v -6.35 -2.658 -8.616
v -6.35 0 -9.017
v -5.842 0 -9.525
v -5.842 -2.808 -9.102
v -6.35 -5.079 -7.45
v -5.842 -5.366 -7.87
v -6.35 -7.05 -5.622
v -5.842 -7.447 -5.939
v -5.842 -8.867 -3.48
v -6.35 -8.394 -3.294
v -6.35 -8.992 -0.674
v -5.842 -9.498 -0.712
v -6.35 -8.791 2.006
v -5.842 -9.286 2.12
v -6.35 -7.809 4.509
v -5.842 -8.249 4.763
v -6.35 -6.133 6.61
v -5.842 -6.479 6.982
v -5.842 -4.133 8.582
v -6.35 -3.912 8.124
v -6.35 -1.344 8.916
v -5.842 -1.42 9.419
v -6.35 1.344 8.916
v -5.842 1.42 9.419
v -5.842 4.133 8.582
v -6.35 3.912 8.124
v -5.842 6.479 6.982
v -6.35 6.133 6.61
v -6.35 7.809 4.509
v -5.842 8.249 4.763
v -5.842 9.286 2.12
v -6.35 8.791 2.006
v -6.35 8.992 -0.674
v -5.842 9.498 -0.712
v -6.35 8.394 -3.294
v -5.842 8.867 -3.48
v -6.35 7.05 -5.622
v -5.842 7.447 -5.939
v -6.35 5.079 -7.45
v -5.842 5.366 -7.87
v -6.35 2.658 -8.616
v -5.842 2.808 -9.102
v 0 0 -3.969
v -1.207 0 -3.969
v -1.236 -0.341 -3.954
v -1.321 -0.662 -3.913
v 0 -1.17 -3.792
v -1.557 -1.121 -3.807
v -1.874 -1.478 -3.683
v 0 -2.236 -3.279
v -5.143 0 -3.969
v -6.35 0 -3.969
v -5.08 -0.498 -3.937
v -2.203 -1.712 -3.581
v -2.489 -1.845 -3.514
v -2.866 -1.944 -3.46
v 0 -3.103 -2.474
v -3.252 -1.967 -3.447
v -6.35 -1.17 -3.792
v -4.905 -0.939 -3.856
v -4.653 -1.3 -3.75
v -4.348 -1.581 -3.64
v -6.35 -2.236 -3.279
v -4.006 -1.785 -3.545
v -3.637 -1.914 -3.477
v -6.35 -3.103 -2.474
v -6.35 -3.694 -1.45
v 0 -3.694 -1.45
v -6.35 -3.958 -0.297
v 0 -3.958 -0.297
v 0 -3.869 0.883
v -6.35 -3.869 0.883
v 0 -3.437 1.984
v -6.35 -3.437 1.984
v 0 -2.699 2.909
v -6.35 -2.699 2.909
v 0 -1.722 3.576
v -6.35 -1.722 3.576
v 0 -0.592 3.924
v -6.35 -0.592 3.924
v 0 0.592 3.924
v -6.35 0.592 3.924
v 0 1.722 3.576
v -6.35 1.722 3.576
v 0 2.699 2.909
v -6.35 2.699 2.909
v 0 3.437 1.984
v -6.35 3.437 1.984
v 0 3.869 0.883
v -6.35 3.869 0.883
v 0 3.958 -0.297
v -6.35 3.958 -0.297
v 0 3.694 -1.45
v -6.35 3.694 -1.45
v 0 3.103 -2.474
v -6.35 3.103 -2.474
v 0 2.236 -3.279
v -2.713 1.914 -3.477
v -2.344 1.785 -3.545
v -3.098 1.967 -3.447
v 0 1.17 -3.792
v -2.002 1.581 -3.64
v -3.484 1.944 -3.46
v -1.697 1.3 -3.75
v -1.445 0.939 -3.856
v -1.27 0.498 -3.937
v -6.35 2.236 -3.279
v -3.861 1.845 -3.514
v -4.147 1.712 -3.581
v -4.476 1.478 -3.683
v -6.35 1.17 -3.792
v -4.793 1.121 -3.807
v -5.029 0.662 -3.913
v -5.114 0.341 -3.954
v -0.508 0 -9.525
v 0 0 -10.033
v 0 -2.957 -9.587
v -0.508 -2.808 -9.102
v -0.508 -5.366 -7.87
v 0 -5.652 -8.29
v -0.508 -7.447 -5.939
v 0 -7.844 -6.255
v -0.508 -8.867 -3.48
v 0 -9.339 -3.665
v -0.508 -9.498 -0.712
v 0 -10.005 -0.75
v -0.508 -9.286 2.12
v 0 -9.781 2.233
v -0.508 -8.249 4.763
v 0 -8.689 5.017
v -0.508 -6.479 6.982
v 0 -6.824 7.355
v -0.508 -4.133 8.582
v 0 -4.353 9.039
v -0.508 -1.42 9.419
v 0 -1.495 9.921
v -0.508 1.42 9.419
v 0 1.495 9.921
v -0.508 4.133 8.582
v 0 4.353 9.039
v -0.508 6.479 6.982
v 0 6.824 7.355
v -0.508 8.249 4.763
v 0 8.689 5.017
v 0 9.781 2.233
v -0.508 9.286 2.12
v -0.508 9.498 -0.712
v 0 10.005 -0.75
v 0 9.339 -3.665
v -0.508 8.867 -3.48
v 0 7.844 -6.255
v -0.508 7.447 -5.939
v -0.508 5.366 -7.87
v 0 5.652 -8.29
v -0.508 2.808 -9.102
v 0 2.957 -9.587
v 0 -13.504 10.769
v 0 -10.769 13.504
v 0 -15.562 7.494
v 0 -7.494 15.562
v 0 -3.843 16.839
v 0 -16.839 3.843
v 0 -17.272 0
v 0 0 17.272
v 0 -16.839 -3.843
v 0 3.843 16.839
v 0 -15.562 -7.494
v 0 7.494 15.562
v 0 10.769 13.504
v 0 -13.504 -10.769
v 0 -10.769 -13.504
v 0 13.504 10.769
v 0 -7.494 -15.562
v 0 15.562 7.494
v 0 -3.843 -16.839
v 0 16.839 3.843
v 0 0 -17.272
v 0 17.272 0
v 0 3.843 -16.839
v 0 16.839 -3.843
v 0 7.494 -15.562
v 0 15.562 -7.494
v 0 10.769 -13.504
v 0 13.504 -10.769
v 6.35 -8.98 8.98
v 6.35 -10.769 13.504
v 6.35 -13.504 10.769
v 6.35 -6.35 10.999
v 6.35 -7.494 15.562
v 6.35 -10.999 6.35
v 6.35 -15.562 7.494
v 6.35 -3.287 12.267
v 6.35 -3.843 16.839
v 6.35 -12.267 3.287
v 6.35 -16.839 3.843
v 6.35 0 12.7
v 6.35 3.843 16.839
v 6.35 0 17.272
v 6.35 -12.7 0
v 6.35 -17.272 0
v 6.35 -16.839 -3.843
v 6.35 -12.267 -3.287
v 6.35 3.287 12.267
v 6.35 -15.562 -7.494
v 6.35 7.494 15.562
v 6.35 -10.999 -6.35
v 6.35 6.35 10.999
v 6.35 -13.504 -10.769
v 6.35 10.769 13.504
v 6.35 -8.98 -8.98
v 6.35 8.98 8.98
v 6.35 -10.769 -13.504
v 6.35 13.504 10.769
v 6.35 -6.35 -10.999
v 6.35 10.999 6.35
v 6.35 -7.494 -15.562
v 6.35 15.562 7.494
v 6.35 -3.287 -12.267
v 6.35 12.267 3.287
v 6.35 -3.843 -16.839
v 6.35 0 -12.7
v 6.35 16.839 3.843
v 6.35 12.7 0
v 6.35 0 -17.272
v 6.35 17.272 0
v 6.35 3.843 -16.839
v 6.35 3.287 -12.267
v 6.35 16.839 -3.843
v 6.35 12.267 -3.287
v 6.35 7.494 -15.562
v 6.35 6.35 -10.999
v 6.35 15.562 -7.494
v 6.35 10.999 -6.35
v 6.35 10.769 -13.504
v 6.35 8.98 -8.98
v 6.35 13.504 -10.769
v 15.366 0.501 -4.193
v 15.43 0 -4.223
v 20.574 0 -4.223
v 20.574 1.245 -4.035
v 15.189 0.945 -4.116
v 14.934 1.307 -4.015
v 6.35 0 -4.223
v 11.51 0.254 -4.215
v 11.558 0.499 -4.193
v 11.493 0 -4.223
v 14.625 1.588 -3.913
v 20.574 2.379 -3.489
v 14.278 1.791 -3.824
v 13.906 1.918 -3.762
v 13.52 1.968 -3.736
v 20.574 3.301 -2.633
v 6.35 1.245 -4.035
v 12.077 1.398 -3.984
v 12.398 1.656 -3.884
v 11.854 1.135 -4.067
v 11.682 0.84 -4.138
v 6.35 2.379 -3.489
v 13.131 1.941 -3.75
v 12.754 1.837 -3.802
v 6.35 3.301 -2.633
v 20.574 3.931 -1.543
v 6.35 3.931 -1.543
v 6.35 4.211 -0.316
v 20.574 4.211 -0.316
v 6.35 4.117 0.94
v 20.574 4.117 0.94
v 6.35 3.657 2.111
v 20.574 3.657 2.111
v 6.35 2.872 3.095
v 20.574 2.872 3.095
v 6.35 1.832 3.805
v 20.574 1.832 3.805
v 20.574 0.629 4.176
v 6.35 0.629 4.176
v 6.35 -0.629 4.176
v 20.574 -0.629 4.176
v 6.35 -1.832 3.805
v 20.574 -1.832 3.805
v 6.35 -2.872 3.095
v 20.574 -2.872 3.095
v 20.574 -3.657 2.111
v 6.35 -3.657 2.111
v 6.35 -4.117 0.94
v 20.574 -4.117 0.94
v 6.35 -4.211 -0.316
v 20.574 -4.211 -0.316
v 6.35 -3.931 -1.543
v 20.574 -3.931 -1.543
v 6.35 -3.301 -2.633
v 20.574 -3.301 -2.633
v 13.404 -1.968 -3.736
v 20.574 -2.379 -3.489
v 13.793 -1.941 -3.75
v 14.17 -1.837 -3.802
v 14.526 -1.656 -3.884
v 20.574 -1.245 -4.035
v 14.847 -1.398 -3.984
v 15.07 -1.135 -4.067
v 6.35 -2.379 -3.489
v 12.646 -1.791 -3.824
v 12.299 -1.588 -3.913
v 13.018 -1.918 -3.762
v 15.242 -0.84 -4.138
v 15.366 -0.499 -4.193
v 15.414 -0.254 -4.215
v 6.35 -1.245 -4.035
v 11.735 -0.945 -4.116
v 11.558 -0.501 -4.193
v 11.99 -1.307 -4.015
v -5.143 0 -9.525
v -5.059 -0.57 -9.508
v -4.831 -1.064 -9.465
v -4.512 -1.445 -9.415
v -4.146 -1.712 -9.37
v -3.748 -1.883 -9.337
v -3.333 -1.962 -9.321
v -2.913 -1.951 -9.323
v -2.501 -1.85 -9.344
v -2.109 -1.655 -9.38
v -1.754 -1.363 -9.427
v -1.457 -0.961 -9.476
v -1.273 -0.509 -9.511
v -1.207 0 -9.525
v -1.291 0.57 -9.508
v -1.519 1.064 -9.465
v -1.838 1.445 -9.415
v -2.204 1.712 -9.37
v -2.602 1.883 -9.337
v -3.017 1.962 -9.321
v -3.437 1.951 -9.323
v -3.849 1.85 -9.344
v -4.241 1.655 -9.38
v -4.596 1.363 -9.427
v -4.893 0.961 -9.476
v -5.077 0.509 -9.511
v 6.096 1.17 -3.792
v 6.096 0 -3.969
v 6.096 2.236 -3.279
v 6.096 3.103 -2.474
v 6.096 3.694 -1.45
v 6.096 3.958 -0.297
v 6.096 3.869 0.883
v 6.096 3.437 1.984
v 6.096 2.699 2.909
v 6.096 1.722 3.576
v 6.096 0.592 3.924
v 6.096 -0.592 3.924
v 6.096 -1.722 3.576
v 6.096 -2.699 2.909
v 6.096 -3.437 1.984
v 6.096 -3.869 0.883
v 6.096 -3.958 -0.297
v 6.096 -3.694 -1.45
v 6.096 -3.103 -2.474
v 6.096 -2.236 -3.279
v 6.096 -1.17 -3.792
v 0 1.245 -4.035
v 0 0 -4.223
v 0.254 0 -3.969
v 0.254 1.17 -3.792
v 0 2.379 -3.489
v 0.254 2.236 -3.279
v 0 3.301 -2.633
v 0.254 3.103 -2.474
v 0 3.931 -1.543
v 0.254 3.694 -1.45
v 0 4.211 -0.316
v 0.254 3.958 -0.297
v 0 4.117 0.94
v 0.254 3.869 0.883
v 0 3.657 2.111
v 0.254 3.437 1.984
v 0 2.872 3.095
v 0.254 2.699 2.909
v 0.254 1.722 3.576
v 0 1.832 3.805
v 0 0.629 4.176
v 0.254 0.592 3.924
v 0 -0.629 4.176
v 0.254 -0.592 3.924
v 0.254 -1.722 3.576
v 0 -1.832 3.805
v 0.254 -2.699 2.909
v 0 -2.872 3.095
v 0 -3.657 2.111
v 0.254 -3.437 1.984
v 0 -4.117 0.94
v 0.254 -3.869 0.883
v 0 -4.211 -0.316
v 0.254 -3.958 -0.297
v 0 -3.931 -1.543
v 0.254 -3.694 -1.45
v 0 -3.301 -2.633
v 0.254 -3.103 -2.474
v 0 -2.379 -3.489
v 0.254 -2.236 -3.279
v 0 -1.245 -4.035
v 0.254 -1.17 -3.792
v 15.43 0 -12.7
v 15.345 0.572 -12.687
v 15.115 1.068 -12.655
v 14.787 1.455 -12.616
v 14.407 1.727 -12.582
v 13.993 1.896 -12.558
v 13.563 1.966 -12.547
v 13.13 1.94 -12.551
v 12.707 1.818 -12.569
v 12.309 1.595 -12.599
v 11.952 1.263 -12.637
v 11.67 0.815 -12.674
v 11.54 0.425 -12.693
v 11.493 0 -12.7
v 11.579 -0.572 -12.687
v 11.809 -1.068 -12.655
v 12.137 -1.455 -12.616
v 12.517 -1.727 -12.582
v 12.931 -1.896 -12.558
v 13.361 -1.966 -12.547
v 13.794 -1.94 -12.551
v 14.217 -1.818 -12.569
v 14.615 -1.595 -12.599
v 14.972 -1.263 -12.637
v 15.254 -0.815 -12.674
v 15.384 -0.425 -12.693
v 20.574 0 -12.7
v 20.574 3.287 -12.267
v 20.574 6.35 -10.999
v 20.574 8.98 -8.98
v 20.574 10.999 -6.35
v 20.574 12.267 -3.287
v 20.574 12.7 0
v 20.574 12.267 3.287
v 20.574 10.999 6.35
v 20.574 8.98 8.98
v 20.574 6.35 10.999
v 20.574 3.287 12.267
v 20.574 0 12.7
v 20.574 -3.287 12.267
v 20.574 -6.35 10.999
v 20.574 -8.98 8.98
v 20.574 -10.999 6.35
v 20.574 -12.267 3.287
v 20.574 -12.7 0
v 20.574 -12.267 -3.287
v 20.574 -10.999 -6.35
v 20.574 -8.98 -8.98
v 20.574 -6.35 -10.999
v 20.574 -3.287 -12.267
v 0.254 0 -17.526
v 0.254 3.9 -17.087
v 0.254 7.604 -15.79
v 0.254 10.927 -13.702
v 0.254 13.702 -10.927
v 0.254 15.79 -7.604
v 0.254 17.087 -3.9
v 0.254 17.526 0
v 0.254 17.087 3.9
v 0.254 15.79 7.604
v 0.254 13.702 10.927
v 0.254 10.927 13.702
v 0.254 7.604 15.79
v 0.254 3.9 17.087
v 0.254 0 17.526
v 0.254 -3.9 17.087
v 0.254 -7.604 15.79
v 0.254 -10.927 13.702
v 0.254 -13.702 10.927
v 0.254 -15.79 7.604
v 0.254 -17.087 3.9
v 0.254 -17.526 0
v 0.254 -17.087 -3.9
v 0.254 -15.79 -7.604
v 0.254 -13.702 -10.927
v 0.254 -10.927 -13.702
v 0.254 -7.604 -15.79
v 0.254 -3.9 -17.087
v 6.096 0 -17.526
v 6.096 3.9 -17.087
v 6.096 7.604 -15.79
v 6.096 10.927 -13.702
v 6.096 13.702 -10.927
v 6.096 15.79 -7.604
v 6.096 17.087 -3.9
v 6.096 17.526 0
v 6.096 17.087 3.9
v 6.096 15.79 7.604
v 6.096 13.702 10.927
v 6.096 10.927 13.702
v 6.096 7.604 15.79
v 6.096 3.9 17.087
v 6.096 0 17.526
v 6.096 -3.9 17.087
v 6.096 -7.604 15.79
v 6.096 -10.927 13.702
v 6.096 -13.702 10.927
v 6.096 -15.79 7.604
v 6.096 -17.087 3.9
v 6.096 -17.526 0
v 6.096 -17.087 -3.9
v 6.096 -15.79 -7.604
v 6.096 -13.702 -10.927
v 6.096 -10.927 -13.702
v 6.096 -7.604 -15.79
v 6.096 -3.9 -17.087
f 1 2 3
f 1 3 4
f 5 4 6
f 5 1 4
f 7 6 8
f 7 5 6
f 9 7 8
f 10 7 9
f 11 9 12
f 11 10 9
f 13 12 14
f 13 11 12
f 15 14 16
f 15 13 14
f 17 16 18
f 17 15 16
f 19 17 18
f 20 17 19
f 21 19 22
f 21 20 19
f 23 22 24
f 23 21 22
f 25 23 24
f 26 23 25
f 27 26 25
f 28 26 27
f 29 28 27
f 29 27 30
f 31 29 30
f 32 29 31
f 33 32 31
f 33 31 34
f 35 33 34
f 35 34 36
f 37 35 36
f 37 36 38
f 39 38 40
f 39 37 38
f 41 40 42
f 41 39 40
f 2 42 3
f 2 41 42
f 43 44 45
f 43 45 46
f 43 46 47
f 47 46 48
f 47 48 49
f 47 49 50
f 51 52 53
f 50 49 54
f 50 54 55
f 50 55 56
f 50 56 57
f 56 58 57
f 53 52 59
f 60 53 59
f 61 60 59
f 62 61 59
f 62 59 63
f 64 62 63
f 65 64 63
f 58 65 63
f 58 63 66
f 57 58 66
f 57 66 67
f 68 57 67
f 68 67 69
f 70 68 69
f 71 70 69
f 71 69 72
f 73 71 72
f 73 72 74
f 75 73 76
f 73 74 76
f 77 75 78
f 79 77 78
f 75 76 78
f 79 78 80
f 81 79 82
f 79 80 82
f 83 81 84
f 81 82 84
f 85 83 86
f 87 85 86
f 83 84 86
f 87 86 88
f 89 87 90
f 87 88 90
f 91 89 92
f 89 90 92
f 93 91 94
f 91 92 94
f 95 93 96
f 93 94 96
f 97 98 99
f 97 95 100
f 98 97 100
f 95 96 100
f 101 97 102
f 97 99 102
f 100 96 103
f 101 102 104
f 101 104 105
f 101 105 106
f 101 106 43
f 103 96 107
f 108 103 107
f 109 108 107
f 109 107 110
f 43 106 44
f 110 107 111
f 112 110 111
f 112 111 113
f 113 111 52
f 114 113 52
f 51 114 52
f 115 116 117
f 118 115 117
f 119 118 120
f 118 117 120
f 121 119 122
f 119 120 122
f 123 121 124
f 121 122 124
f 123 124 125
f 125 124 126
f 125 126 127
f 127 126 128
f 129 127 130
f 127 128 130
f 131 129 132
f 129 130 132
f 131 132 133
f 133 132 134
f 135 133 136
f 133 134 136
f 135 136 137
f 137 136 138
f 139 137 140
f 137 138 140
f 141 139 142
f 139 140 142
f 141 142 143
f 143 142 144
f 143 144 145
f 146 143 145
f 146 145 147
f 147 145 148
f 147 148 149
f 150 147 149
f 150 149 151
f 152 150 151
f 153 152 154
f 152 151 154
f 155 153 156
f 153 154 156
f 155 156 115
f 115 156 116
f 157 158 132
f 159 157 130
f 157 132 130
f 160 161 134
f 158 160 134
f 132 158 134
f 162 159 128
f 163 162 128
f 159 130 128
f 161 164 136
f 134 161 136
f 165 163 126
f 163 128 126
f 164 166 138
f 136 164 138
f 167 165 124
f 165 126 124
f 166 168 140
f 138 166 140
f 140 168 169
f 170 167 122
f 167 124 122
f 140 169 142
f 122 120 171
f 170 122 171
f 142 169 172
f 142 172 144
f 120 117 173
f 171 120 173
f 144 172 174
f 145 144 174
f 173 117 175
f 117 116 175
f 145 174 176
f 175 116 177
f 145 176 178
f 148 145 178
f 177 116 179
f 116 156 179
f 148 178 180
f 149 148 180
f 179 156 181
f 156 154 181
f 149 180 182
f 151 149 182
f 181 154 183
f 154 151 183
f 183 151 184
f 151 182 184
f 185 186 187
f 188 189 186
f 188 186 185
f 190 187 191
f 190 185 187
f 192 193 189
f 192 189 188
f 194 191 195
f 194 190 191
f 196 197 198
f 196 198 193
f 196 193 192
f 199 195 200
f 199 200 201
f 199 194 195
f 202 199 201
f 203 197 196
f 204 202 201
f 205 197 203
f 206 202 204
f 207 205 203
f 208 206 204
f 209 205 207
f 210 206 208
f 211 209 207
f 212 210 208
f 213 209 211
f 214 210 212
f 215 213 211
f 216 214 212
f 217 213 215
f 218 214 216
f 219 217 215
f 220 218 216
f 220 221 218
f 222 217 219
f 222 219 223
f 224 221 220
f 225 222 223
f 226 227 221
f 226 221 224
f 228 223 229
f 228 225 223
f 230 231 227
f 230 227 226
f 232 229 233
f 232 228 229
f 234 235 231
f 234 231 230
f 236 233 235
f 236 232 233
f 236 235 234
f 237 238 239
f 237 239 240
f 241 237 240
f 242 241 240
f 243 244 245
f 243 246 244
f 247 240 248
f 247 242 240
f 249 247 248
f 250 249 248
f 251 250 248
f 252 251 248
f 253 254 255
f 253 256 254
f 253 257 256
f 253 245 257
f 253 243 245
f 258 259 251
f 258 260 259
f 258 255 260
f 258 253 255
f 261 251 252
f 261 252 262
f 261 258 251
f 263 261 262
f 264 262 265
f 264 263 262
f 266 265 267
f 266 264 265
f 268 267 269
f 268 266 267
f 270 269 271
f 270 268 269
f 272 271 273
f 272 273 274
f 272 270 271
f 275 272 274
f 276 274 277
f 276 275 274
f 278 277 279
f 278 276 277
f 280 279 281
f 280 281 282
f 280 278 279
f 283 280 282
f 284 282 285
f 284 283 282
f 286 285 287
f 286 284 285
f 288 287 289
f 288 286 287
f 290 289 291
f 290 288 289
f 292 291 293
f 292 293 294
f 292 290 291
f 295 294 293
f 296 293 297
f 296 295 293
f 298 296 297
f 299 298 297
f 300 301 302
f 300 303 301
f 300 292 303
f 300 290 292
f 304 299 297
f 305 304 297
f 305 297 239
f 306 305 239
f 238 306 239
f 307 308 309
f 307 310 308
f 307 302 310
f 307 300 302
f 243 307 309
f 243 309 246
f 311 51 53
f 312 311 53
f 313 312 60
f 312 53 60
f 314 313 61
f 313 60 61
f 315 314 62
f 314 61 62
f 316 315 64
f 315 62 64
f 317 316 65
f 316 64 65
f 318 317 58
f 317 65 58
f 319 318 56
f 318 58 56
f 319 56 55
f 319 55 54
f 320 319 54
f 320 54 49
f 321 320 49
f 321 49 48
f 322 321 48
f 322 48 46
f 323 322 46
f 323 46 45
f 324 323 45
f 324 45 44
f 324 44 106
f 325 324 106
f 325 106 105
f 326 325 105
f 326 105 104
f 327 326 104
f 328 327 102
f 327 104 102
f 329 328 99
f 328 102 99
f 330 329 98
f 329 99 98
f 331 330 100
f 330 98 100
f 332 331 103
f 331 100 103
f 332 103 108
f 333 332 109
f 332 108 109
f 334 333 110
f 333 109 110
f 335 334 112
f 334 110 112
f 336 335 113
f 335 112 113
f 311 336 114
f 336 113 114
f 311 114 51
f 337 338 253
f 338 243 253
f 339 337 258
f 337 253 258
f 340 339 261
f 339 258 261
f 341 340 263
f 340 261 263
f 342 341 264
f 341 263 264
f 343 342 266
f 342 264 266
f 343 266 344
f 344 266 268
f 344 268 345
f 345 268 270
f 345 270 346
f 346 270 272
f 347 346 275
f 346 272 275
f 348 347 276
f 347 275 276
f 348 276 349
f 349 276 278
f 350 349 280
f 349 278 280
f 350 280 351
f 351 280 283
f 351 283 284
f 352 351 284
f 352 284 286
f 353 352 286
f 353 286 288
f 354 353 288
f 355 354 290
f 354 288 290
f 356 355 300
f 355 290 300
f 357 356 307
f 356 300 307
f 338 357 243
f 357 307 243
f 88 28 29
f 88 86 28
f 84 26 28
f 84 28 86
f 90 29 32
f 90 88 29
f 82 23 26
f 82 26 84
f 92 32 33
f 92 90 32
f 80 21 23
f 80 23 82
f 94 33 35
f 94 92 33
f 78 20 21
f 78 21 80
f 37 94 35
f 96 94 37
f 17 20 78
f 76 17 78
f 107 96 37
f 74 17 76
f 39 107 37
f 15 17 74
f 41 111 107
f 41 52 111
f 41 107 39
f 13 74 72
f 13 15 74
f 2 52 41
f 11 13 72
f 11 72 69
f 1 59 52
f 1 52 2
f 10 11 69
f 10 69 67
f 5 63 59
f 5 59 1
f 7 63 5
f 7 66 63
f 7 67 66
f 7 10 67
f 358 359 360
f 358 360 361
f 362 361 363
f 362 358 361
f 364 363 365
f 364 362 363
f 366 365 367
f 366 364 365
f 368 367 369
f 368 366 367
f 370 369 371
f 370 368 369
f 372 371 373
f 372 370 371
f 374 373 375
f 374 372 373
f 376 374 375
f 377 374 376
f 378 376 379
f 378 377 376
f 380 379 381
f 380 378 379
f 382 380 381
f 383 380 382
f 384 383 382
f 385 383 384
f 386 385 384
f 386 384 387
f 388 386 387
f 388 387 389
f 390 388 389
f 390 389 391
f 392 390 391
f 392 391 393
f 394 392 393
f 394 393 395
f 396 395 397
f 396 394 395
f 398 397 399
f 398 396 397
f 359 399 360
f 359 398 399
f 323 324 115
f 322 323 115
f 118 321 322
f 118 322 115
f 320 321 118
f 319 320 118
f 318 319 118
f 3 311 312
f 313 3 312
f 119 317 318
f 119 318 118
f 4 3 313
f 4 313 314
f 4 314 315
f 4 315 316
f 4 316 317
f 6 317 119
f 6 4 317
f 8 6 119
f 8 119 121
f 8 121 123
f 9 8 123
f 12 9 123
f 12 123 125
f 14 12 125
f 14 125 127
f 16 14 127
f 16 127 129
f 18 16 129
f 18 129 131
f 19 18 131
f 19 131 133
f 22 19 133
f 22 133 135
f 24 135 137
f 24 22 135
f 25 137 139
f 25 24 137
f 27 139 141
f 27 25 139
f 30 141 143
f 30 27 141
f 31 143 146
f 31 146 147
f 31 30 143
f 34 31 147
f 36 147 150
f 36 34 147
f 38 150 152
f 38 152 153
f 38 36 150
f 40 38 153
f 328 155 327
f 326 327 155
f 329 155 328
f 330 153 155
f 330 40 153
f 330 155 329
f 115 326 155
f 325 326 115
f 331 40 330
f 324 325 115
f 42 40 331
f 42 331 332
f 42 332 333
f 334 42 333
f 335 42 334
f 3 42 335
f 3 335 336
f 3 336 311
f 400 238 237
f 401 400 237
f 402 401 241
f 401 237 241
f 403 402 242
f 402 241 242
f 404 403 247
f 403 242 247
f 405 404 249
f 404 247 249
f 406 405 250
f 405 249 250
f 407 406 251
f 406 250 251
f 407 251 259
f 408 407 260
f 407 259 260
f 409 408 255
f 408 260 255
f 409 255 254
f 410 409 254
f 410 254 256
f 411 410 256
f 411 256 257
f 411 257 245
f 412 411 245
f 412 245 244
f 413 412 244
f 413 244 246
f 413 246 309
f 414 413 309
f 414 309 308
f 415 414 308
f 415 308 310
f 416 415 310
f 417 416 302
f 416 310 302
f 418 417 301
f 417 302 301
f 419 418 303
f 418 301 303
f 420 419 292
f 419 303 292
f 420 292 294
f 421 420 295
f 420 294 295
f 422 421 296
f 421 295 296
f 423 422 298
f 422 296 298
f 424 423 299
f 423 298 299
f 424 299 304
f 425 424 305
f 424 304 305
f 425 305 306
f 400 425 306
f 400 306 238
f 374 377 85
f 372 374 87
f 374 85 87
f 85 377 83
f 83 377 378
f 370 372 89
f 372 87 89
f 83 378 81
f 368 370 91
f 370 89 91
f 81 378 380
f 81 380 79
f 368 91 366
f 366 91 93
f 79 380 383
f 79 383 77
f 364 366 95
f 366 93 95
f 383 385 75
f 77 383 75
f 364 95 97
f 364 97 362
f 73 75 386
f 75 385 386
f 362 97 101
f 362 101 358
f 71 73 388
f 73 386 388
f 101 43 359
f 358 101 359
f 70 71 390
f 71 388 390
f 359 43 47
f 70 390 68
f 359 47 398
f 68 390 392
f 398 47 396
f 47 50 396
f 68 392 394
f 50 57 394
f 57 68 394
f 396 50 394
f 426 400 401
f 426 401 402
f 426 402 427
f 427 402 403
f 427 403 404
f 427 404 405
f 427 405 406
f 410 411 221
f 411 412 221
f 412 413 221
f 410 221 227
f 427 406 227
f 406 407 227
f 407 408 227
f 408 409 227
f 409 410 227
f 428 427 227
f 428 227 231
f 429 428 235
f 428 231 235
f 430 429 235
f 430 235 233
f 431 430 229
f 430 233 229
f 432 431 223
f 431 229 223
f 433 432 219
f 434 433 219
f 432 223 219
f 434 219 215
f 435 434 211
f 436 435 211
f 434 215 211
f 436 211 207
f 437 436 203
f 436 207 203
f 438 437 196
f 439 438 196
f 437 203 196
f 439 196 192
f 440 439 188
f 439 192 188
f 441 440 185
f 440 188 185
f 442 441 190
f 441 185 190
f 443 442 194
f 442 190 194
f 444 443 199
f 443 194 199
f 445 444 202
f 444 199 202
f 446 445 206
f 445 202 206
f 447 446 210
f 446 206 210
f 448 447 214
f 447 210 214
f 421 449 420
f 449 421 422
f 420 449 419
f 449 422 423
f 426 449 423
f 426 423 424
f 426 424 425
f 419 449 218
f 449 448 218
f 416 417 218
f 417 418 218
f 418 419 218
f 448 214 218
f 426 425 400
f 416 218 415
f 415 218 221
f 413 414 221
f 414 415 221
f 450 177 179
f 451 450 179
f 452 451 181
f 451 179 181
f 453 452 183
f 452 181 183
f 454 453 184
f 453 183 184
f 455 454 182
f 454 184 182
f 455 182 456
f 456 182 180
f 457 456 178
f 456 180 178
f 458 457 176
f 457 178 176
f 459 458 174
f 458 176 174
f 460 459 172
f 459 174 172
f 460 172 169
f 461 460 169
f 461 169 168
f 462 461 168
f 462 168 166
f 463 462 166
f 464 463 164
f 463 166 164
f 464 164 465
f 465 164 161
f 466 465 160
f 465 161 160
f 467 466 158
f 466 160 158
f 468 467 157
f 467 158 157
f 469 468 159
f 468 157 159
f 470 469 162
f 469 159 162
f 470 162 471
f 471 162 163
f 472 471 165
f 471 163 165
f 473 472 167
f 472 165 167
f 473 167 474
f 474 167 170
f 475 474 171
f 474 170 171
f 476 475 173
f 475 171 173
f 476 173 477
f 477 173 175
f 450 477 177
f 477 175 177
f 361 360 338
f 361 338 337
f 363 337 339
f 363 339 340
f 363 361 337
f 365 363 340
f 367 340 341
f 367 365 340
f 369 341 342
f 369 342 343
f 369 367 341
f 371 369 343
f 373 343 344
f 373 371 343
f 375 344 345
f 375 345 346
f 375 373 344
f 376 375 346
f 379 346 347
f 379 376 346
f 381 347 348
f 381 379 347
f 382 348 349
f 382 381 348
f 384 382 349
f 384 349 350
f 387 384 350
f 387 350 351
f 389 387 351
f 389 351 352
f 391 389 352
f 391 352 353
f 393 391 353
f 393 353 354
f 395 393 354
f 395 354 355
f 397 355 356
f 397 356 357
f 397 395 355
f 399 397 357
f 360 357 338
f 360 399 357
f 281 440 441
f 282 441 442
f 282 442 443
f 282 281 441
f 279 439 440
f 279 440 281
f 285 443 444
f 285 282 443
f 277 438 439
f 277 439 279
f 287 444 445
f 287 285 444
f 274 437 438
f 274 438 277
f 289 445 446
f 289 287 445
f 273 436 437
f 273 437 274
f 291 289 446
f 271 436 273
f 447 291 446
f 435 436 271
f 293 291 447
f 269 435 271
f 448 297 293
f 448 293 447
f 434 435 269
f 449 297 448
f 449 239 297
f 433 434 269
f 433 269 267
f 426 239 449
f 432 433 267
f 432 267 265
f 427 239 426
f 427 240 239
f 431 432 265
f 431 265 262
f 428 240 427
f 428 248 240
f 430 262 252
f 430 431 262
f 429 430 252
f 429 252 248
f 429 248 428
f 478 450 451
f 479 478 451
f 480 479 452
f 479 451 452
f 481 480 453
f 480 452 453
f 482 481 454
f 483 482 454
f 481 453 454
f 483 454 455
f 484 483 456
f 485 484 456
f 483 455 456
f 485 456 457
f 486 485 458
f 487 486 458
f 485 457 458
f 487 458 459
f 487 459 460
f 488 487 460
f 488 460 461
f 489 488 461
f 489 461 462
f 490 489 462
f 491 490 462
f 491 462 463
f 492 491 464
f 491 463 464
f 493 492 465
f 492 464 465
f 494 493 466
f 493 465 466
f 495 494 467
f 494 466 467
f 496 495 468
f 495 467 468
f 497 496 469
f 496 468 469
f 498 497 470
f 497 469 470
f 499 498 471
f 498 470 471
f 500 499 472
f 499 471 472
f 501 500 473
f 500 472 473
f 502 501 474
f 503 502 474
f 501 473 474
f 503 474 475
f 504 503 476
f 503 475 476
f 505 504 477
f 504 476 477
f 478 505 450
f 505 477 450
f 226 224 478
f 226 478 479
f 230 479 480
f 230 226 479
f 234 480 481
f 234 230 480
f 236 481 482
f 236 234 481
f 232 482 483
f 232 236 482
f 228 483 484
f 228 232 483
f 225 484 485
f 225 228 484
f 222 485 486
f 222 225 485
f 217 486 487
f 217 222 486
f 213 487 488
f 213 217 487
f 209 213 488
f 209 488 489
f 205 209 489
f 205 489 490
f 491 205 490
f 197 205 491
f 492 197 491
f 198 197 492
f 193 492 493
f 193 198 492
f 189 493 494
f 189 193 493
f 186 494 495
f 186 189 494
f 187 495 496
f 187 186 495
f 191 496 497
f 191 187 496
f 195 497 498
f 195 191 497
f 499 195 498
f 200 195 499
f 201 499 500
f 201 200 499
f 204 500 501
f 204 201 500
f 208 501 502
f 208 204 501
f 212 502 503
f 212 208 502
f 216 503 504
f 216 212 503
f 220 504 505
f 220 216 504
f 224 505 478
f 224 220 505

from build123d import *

# Parameters (mm, degrees)
SKETCH1_R           = 17.526
SKETCH1_R_2         = 3.96875
BOSS_EXTRUDE1_DEPTH = 6.35
CHAMFER2_SIZE       = 0.254
BOSS_EXTRUDE2_START = 6.35
SKETCH3_R           = 9.525
SKETCH3_R_2         = 3.96875
BOSS_EXTRUDE2_DEPTH = 6.35
CHAMFER3_SIZE       = 0.508
SKETCH8_R           = 12.7
SKETCH8_R_2         = 4.22275
BOSS_EXTRUDE3_DEPTH = 14.224
SKETCH6_R           = 1.9685
CUT_EXTRUDE2_DEPTH  = 16.764


with BuildPart() as part:
    # Sketch1 → Boss-Extrude1 (new body)
    with BuildSketch(Plane(origin=(0, 0, 0), x_dir=(0, 0, -1), z_dir=(1, 0, 0))):
        Circle(SKETCH1_R)
        Circle(SKETCH1_R_2, mode=Mode.SUBTRACT)
    extrude(amount=BOSS_EXTRUDE1_DEPTH)

    # Chamfer2
    chamfer2_edges = [part.edges().sort_by_distance(p)[0] for p in [
        (0, 0, 17.526),
        (6.35, 0, 17.526),
        (0, 0, 3.96875),
        (6.35, 0, 3.96875),
    ]]
    chamfer(chamfer2_edges, length=CHAMFER2_SIZE)

    # Sketch3 → Boss-Extrude2 (add)
    with BuildSketch(Plane.ZY.offset(BOSS_EXTRUDE2_START)):
        with Locations(Location((0, 0, 0), (0, 0, 180))):
            Circle(SKETCH3_R)
        with Locations(Location((0, 0, 0), (0, 0, 180))):
            Circle(SKETCH3_R_2, mode=Mode.SUBTRACT)
    extrude(amount=-BOSS_EXTRUDE2_DEPTH)

    # Chamfer3
    chamfer3_edges = [part.edges().sort_by_distance(p)[0] for p in [
        (0, 0, 9.525),
        (-6.35, 0, 9.525),
    ]]
    chamfer(chamfer3_edges, length=CHAMFER3_SIZE)

    # Sketch8 → Boss-Extrude3 (add)
    with BuildSketch(Plane(origin=(6.35, 0, 0), x_dir=(0, 0, -1), z_dir=(1, 0, 0))):
        Circle(SKETCH8_R)
        Circle(SKETCH8_R_2, mode=Mode.SUBTRACT)
    extrude(amount=BOSS_EXTRUDE3_DEPTH)

    # Sketch6 → Cut-Extrude2 (cut)
    with BuildSketch(Plane.XY):
        with Locations(Location((-3.175, 0, 0), (0, 0, 180))):
            Circle(SKETCH6_R)
        with Locations((13.462, 0)):
            Circle(SKETCH6_R)
    extrude(amount=-CUT_EXTRUDE2_DEPTH, mode=Mode.SUBTRACT)


solid = part.part
